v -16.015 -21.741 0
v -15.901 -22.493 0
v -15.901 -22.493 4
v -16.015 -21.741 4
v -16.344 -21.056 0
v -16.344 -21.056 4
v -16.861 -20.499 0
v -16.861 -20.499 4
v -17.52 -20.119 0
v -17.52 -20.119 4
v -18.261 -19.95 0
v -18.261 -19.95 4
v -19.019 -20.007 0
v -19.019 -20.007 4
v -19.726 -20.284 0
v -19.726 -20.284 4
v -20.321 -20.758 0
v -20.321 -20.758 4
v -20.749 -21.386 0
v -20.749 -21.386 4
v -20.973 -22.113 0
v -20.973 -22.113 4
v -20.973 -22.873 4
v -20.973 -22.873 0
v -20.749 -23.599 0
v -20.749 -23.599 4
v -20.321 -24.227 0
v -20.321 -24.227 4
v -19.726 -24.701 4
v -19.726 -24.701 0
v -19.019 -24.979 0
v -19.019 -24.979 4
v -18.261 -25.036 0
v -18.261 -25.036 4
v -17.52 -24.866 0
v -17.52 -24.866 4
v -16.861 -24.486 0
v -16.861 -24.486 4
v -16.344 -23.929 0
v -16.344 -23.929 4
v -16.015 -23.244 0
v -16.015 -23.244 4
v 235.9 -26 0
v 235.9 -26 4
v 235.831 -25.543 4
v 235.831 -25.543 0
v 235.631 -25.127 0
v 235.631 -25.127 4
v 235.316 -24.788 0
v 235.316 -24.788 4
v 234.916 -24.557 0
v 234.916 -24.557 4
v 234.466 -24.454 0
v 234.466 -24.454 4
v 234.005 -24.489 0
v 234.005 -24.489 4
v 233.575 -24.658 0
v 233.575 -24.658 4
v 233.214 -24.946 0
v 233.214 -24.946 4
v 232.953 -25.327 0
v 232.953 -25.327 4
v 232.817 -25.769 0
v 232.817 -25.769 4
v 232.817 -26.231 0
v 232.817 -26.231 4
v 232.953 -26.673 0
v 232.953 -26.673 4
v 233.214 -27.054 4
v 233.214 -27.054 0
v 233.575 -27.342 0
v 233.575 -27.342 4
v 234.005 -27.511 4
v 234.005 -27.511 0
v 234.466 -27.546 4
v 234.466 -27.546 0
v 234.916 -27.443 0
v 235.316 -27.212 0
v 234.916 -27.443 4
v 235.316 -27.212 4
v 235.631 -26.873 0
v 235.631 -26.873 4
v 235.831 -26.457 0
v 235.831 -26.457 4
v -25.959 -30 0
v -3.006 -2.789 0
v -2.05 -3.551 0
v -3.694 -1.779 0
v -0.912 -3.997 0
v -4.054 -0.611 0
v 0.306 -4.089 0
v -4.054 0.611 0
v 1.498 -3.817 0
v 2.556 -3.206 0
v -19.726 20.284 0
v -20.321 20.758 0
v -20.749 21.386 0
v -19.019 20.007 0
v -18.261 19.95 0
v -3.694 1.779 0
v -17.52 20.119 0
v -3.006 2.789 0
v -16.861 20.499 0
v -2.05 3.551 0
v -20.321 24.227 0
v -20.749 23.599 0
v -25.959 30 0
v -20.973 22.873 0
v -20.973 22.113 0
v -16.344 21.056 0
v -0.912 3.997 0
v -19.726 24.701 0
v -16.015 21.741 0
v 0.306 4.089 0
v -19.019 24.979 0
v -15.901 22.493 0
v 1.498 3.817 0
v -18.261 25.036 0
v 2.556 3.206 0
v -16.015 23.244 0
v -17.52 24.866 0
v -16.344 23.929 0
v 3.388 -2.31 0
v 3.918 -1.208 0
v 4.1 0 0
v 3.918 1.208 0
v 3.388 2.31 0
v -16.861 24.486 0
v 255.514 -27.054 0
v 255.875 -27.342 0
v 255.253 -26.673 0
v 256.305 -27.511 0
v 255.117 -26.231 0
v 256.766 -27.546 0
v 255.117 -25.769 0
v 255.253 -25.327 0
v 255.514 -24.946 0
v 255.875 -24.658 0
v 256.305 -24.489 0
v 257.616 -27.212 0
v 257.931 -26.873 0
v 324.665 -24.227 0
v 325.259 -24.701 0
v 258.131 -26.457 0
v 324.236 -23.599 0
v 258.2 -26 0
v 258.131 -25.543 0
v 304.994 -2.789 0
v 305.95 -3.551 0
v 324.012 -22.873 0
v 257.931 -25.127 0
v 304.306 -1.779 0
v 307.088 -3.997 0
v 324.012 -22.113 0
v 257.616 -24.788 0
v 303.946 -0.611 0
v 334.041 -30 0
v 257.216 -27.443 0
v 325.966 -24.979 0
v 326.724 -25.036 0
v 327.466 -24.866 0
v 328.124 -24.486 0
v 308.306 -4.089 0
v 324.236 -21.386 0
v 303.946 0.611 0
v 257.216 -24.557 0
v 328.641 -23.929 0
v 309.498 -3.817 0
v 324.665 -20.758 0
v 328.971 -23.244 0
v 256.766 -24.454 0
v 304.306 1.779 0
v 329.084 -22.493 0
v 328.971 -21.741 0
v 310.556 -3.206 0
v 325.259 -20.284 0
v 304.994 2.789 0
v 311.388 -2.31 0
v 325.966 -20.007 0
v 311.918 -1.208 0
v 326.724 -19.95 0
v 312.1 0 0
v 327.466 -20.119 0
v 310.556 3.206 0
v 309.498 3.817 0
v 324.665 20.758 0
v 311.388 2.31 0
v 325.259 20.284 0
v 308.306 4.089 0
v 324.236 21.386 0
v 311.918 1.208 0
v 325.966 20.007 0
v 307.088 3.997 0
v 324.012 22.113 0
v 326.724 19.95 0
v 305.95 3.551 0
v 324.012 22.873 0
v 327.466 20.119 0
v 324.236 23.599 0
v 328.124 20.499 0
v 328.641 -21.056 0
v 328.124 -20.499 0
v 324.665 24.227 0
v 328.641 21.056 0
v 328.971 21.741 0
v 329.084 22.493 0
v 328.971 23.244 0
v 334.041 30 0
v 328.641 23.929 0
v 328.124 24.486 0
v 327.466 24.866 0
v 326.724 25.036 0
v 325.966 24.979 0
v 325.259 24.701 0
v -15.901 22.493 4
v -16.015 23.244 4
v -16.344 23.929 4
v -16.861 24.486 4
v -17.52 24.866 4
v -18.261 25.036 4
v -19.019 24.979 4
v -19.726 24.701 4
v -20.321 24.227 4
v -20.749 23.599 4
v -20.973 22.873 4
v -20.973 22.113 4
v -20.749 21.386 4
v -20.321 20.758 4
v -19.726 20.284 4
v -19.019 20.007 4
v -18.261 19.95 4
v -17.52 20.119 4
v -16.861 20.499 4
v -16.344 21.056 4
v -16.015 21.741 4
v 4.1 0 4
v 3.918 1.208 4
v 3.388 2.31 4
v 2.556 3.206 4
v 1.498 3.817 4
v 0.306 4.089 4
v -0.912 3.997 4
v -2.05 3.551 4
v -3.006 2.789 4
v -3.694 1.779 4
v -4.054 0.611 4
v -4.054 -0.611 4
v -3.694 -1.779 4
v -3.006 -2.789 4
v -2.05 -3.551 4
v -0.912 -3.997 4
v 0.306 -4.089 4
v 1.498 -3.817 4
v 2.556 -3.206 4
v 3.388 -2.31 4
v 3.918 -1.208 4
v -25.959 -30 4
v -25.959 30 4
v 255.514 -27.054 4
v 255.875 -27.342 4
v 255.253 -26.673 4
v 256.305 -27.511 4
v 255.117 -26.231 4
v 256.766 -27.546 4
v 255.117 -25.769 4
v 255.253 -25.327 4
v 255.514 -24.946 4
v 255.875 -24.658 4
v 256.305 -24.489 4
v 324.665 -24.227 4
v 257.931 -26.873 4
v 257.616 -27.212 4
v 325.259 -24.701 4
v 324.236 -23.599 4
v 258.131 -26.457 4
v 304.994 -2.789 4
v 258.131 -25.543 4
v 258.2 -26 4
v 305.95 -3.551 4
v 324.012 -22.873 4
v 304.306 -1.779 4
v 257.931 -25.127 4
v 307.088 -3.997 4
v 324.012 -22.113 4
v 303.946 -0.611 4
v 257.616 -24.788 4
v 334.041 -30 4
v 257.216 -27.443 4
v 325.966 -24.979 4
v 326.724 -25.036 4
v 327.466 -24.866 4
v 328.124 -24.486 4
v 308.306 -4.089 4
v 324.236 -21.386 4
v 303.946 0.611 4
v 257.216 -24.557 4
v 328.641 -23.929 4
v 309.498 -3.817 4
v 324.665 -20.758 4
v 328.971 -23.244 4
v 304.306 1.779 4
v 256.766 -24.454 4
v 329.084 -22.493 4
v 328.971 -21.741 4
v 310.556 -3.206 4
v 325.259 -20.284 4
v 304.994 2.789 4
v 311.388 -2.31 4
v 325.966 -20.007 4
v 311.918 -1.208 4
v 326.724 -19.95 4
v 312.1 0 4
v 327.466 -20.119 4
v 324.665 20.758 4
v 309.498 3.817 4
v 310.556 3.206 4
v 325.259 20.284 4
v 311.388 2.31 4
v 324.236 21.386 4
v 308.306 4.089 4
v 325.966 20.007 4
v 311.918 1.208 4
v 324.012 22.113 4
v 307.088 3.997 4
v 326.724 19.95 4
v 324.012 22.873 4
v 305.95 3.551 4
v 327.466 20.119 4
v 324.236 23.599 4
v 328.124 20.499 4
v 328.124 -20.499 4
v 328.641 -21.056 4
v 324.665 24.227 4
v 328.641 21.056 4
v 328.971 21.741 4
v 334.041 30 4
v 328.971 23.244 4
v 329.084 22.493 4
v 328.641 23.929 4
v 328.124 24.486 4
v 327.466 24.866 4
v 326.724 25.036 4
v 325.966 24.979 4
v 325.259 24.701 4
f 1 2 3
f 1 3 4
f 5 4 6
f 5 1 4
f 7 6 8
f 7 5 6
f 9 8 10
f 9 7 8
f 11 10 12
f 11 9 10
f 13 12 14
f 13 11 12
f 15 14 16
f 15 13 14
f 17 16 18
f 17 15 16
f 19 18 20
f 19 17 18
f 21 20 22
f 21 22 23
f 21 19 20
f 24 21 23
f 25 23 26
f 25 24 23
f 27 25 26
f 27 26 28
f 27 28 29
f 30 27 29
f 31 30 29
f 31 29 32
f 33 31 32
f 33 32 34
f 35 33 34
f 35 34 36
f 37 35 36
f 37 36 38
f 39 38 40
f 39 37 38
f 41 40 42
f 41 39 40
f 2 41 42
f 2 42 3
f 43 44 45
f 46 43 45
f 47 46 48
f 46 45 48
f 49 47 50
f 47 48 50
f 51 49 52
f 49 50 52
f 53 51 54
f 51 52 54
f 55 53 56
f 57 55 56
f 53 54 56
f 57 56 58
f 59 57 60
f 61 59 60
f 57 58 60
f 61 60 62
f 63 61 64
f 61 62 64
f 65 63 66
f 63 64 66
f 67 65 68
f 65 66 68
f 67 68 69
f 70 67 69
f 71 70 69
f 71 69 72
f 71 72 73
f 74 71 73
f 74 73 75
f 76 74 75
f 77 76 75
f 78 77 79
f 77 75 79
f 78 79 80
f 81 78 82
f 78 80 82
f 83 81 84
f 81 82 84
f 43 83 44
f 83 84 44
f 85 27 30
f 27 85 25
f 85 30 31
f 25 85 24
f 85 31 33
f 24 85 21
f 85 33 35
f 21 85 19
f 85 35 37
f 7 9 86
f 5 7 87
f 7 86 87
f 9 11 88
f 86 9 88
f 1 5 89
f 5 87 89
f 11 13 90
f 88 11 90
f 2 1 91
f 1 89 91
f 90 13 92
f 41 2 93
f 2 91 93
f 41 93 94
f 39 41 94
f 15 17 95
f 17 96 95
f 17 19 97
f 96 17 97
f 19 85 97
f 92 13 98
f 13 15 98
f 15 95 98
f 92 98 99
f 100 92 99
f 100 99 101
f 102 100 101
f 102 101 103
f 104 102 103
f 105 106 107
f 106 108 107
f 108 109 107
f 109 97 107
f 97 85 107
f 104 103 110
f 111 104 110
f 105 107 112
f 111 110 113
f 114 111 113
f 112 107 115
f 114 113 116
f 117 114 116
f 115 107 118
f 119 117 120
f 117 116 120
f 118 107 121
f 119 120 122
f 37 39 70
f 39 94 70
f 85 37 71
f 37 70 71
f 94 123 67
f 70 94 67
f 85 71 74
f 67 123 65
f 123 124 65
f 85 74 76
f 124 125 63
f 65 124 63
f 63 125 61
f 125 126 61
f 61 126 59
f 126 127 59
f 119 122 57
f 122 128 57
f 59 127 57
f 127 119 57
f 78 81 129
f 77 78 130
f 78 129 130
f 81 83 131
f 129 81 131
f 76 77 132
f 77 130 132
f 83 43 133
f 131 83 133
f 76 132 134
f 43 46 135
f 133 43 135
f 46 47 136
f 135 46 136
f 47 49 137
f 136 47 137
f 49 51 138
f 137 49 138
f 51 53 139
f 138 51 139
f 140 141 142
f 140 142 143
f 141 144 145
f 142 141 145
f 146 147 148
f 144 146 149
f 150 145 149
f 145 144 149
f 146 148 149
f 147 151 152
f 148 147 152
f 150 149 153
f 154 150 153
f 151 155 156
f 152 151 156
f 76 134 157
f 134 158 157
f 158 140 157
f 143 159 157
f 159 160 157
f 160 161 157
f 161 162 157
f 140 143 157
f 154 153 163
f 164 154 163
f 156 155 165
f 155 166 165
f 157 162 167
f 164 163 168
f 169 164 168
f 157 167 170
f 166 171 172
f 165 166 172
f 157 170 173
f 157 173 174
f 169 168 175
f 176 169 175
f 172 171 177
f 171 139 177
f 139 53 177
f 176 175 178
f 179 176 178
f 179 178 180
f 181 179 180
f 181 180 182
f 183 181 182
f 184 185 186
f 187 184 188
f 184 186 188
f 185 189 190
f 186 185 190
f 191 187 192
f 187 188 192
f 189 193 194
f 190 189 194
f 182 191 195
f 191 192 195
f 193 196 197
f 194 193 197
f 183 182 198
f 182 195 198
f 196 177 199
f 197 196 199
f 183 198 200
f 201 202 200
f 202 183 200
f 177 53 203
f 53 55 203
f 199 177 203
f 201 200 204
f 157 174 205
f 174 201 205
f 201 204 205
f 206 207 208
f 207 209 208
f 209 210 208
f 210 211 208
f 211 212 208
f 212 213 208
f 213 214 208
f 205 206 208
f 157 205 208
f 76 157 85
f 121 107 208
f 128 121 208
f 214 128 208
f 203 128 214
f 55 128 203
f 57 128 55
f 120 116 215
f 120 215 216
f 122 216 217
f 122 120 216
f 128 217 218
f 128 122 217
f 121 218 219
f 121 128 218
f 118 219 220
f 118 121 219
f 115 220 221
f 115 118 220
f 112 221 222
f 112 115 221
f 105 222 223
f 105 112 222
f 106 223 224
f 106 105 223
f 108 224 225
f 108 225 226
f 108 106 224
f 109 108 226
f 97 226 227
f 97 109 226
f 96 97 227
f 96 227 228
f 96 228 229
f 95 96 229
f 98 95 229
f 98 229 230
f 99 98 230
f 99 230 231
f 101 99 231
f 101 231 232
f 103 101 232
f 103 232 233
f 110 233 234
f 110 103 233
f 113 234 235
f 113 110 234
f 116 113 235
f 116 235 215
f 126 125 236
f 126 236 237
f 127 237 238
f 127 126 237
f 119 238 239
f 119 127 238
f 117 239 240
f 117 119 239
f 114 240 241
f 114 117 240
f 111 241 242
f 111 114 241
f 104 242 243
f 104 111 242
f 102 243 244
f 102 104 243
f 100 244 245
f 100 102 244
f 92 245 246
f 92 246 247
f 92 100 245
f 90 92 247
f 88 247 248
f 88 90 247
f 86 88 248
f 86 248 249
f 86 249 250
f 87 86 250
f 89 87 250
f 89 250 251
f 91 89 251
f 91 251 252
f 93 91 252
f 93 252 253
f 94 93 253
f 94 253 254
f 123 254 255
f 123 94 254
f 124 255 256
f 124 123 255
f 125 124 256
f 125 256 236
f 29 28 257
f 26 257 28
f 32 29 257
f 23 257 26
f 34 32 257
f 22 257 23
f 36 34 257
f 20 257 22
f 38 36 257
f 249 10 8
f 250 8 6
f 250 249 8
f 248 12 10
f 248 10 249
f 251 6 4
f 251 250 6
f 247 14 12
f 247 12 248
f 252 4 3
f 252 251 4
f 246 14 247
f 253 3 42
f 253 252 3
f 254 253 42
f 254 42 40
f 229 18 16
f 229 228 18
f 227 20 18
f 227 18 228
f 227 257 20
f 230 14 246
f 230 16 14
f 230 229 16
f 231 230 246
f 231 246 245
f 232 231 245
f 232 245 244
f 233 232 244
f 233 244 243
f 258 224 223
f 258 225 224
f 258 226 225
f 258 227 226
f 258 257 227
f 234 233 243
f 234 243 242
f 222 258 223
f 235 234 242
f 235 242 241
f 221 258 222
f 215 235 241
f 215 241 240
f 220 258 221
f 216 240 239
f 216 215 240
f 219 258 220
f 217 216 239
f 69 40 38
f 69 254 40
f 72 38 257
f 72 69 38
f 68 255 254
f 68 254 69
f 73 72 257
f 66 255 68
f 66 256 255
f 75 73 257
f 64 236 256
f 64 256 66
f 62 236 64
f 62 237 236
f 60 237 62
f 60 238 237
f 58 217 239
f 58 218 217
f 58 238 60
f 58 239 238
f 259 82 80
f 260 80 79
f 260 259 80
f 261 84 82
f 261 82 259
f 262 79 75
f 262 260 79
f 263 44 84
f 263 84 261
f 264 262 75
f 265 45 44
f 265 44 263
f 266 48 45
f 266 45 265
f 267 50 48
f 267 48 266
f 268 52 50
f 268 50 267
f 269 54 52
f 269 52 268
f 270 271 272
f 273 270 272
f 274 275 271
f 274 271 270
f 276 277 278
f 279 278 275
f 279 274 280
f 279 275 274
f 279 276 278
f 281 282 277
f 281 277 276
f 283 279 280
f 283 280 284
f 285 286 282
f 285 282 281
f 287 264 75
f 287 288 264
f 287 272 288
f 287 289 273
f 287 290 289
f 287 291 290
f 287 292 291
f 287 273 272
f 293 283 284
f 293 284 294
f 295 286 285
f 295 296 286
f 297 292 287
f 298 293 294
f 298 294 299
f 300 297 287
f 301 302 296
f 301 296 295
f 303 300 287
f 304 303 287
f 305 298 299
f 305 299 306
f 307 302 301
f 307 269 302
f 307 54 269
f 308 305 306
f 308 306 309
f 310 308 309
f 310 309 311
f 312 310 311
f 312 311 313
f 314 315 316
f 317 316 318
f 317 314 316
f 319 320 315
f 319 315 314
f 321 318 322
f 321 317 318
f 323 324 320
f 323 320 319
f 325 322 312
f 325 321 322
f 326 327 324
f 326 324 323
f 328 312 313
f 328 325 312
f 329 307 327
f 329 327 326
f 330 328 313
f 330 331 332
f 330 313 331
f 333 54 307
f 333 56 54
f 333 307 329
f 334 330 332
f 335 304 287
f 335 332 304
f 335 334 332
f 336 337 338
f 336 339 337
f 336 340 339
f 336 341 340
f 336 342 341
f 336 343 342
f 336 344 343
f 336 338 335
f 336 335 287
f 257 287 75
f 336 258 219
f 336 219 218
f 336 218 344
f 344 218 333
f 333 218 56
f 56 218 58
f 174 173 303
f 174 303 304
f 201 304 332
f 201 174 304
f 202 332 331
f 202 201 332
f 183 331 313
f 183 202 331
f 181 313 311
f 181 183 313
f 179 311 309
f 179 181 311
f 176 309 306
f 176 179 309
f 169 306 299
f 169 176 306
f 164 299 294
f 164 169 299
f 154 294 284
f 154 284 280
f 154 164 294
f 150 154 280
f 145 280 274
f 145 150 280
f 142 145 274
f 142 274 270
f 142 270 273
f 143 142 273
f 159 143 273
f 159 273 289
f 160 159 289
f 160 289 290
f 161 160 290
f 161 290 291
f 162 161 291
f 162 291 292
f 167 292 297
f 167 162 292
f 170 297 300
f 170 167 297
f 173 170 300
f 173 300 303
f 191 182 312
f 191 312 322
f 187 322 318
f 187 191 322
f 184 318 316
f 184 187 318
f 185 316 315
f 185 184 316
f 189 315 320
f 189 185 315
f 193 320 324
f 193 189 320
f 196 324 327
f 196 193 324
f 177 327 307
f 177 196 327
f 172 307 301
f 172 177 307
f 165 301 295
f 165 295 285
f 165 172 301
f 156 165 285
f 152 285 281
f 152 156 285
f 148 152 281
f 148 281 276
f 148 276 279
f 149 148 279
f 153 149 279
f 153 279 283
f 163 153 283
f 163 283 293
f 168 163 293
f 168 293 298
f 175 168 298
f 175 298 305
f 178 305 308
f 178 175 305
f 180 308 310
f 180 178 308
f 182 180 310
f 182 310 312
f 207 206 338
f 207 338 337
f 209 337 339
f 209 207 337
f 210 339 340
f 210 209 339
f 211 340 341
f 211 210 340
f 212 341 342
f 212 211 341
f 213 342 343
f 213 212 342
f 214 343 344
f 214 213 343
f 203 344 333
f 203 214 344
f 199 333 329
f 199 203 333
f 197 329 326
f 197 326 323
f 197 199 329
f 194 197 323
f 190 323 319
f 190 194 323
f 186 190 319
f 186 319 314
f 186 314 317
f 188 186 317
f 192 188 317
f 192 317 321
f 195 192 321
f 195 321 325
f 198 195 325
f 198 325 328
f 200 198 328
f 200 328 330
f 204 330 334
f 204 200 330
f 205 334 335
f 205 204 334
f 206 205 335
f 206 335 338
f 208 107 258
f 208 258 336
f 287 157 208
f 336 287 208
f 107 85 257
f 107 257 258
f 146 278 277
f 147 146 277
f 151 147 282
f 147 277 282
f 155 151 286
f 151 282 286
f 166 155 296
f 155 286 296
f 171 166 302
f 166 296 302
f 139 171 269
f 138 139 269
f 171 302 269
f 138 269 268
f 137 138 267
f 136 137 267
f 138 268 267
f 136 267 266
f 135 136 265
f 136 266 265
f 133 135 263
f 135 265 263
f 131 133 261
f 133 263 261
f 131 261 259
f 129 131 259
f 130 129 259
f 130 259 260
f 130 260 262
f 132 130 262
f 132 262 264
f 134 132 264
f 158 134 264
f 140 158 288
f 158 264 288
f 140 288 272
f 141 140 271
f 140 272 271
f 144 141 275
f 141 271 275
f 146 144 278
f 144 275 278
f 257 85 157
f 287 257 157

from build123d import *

# Parameters (mm, degrees)
SKETCH1_W           = 360
SKETCH1_H           = 60
SKETCH1_R           = 4.1
SKETCH1_R_2         = 2.55
BOSS_EXTRUDE1_DEPTH = 4
SKETCH3_R           = 1.55
CUT_EXTRUDE2_DEPTH  = 4


with BuildPart() as part:
    # Sketch1 → Boss-Extrude1 (new body)
    with BuildSketch(Plane.XY):
        with Locations((154.041275094, 0)):
            Rectangle(SKETCH1_W, SKETCH1_H)
        Circle(SKETCH1_R, mode=Mode.SUBTRACT)
        with Locations((308, 0)):
            Circle(SKETCH1_R, mode=Mode.SUBTRACT)
        with Locations((-18.451377883, 22.492652976)):
            Circle(SKETCH1_R_2, mode=Mode.SUBTRACT)
        with Locations((-18.451377883, -22.492652976)):
            Circle(SKETCH1_R_2, mode=Mode.SUBTRACT)
        with Locations((326.53392807, 22.492652976)):
            Circle(SKETCH1_R_2, mode=Mode.SUBTRACT)
        with Locations((326.53392807, -22.492652976)):
            Circle(SKETCH1_R_2, mode=Mode.SUBTRACT)
    extrude(amount=BOSS_EXTRUDE1_DEPTH)

    # Sketch3 → Cut-Extrude2 (cut)
    with BuildSketch(Plane.XY.offset(4)):
        with Locations((256.65, -26)):
            Circle(SKETCH3_R)
        with Locations((234.35, -26)):
            Circle(SKETCH3_R)
    extrude(amount=-CUT_EXTRUDE2_DEPTH, mode=Mode.SUBTRACT)


solid = part.part
